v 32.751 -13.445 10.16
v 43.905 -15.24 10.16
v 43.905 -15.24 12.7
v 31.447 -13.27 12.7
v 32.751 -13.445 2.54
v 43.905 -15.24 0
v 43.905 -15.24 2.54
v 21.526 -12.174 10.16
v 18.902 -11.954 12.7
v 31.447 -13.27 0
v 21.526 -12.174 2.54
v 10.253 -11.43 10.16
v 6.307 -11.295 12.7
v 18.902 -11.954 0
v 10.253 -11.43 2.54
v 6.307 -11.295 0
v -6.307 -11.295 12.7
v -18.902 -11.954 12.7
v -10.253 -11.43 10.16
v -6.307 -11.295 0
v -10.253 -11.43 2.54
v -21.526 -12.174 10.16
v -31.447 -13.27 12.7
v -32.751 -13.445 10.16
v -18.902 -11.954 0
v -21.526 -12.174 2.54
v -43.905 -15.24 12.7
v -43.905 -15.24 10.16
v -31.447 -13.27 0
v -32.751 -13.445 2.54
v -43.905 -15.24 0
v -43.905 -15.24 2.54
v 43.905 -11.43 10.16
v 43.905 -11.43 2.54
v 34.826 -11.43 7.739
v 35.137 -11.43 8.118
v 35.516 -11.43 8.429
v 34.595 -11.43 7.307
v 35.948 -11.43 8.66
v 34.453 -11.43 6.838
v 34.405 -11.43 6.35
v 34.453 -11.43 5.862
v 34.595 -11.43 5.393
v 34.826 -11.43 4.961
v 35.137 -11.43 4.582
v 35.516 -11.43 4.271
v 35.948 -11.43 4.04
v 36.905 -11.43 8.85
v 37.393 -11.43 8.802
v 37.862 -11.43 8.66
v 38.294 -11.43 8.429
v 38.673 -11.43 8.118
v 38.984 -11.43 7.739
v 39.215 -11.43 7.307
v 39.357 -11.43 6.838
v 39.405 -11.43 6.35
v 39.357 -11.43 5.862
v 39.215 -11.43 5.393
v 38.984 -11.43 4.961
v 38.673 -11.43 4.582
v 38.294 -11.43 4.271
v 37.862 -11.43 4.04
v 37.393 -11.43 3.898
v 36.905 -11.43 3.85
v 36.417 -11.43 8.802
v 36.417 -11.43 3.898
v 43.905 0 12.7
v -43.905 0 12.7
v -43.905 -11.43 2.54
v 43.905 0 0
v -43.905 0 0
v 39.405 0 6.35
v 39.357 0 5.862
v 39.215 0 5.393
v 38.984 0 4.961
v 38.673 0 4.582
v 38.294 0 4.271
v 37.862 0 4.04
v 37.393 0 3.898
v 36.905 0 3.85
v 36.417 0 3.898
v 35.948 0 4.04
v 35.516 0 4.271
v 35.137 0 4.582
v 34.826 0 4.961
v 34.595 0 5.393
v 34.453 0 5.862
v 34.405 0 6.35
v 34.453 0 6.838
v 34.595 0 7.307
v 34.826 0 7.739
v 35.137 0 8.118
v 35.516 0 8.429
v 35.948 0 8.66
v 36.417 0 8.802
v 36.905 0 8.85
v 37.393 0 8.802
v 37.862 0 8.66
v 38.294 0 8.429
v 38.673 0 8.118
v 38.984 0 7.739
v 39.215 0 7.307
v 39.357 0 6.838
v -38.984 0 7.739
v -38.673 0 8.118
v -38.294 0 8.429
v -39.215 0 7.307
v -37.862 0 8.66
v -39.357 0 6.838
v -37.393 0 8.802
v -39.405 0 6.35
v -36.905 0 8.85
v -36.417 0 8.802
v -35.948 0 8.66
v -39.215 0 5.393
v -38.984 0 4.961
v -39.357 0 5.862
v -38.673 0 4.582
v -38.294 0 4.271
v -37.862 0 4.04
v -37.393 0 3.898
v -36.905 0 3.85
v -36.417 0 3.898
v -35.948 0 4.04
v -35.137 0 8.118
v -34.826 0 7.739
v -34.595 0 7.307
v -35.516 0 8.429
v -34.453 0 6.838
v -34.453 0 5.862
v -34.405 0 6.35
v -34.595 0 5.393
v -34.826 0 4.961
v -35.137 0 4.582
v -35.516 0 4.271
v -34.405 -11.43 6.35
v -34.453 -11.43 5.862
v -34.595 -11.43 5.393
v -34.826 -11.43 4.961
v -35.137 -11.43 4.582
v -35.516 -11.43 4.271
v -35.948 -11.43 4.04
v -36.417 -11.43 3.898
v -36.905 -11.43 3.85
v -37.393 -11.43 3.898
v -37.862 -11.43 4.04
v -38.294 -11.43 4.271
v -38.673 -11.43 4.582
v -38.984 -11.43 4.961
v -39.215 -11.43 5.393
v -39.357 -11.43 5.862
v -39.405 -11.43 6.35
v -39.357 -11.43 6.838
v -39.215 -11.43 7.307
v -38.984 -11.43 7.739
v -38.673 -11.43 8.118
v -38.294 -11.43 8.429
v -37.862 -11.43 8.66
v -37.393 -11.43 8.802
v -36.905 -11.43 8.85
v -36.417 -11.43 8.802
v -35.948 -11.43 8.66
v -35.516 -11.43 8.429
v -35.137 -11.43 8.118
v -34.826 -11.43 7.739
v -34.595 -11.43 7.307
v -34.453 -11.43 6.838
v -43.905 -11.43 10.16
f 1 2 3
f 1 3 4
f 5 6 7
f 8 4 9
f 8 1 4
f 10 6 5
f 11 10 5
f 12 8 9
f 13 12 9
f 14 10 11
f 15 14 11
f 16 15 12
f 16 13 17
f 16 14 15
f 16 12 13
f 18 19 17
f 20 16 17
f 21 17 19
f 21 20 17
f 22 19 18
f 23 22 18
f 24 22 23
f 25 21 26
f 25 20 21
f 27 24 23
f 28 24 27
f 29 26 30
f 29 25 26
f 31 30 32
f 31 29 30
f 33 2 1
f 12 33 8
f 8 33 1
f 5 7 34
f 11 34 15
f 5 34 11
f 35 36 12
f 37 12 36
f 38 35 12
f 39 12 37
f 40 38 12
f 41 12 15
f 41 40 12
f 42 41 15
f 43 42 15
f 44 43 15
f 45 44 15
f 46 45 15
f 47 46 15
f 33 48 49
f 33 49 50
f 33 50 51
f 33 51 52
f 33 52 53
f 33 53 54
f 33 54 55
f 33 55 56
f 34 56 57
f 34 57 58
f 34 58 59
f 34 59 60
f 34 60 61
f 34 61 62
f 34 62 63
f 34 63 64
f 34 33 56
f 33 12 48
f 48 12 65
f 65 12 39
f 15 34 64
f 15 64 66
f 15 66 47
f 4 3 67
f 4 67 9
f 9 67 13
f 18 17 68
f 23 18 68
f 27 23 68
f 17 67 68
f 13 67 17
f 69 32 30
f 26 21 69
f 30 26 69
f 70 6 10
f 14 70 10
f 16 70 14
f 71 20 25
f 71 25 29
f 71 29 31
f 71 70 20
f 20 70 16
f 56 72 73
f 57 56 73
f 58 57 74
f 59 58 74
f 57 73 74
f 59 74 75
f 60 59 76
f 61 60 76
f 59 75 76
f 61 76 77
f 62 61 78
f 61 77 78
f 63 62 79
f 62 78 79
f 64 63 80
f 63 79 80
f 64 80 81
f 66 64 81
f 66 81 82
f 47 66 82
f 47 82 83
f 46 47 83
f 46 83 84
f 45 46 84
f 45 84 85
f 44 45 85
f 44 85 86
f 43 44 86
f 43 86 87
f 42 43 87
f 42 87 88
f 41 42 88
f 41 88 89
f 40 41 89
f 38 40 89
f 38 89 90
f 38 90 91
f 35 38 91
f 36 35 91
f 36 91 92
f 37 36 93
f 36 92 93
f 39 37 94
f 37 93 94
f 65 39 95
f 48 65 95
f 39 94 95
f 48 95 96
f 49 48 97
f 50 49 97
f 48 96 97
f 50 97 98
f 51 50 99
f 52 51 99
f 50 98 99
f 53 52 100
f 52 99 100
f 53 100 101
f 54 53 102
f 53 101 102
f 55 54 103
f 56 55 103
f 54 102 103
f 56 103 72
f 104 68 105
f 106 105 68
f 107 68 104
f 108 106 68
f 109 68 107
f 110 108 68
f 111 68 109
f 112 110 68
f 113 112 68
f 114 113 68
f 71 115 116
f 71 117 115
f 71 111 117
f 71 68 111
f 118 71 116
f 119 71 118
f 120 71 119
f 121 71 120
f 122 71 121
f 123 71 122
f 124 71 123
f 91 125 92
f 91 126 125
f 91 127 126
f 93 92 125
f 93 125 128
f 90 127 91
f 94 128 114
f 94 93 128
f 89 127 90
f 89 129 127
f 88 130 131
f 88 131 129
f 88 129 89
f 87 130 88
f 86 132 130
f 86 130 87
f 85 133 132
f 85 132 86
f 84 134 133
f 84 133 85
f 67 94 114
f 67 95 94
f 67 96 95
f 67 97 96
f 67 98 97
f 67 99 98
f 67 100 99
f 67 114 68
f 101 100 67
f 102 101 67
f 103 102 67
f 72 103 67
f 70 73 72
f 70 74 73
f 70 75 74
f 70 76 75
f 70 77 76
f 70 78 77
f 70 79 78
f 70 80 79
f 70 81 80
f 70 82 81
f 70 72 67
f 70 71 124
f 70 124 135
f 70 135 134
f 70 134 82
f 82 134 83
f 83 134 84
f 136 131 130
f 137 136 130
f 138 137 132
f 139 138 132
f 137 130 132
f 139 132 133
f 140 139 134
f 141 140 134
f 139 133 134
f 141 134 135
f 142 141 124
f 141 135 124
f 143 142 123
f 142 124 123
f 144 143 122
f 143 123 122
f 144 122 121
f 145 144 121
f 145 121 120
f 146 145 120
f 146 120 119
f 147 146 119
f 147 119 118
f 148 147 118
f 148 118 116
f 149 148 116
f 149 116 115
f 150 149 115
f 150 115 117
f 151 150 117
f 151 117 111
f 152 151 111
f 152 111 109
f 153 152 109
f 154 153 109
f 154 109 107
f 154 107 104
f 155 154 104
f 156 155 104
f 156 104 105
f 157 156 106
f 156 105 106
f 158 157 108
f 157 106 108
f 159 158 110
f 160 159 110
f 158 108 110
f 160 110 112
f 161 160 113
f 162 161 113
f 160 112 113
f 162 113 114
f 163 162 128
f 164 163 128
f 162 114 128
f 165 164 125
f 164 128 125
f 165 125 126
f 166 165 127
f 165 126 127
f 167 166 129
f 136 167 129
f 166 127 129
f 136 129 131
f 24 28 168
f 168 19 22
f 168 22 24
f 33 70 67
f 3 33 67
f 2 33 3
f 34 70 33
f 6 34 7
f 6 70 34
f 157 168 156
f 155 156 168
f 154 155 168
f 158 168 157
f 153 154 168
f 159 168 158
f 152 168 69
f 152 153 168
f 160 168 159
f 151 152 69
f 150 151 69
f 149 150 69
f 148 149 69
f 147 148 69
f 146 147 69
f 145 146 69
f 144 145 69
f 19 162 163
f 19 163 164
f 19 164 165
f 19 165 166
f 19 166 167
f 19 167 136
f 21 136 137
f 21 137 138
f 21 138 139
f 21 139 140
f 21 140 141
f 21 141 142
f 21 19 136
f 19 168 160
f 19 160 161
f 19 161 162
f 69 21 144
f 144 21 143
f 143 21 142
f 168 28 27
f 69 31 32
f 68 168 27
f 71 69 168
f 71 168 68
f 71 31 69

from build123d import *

# Parameters (mm, degrees)
BOSS_EXTRUDE1_DEPTH = 12.7
SKETCH2_R           = 2.5
CUT_EXTRUDE1_DEPTH  = 16.24
SKETCH3_W           = 7.62
SKETCH3_H           = 3.81
CUT_EXTRUDE2_DEPTH  = 88.8100001


with BuildPart() as part:
    # Sketch1 → Boss-Extrude1 (new body)
    with BuildSketch(Plane.XY):
        with BuildLine():
            Line((-43.905, 0), (43.905, 0))
            Line((43.905, 0), (43.905, -15.24))
            ThreePointArc((43.905, -15.24), (0, -11.212082165), (-43.905, -15.24))
            Line((-43.905, -15.24), (-43.905, 0))
        make_face()
    extrude(amount=BOSS_EXTRUDE1_DEPTH)

    # Sketch2 → Cut-Extrude1 (cut, through all)
    with BuildSketch(Plane(origin=(0, 0, 0), x_dir=(1, 0, 0), z_dir=(0, 1, 0))):
        with Locations((-36.905, -6.35)):
            Circle(SKETCH2_R)
        with Locations((36.905, -6.35)):
            Circle(SKETCH2_R)
    extrude(amount=-CUT_EXTRUDE1_DEPTH, mode=Mode.SUBTRACT)

    # Sketch3 → Cut-Extrude2 (cut, through all)
    with BuildSketch(Plane(origin=(43.905, 0, 0), x_dir=(0, 0, -1), z_dir=(1, 0, 0))):
        with Locations((-6.35, -13.335)):
            Rectangle(SKETCH3_W, SKETCH3_H)
    extrude(amount=-CUT_EXTRUDE2_DEPTH, mode=Mode.SUBTRACT)


solid = part.part
